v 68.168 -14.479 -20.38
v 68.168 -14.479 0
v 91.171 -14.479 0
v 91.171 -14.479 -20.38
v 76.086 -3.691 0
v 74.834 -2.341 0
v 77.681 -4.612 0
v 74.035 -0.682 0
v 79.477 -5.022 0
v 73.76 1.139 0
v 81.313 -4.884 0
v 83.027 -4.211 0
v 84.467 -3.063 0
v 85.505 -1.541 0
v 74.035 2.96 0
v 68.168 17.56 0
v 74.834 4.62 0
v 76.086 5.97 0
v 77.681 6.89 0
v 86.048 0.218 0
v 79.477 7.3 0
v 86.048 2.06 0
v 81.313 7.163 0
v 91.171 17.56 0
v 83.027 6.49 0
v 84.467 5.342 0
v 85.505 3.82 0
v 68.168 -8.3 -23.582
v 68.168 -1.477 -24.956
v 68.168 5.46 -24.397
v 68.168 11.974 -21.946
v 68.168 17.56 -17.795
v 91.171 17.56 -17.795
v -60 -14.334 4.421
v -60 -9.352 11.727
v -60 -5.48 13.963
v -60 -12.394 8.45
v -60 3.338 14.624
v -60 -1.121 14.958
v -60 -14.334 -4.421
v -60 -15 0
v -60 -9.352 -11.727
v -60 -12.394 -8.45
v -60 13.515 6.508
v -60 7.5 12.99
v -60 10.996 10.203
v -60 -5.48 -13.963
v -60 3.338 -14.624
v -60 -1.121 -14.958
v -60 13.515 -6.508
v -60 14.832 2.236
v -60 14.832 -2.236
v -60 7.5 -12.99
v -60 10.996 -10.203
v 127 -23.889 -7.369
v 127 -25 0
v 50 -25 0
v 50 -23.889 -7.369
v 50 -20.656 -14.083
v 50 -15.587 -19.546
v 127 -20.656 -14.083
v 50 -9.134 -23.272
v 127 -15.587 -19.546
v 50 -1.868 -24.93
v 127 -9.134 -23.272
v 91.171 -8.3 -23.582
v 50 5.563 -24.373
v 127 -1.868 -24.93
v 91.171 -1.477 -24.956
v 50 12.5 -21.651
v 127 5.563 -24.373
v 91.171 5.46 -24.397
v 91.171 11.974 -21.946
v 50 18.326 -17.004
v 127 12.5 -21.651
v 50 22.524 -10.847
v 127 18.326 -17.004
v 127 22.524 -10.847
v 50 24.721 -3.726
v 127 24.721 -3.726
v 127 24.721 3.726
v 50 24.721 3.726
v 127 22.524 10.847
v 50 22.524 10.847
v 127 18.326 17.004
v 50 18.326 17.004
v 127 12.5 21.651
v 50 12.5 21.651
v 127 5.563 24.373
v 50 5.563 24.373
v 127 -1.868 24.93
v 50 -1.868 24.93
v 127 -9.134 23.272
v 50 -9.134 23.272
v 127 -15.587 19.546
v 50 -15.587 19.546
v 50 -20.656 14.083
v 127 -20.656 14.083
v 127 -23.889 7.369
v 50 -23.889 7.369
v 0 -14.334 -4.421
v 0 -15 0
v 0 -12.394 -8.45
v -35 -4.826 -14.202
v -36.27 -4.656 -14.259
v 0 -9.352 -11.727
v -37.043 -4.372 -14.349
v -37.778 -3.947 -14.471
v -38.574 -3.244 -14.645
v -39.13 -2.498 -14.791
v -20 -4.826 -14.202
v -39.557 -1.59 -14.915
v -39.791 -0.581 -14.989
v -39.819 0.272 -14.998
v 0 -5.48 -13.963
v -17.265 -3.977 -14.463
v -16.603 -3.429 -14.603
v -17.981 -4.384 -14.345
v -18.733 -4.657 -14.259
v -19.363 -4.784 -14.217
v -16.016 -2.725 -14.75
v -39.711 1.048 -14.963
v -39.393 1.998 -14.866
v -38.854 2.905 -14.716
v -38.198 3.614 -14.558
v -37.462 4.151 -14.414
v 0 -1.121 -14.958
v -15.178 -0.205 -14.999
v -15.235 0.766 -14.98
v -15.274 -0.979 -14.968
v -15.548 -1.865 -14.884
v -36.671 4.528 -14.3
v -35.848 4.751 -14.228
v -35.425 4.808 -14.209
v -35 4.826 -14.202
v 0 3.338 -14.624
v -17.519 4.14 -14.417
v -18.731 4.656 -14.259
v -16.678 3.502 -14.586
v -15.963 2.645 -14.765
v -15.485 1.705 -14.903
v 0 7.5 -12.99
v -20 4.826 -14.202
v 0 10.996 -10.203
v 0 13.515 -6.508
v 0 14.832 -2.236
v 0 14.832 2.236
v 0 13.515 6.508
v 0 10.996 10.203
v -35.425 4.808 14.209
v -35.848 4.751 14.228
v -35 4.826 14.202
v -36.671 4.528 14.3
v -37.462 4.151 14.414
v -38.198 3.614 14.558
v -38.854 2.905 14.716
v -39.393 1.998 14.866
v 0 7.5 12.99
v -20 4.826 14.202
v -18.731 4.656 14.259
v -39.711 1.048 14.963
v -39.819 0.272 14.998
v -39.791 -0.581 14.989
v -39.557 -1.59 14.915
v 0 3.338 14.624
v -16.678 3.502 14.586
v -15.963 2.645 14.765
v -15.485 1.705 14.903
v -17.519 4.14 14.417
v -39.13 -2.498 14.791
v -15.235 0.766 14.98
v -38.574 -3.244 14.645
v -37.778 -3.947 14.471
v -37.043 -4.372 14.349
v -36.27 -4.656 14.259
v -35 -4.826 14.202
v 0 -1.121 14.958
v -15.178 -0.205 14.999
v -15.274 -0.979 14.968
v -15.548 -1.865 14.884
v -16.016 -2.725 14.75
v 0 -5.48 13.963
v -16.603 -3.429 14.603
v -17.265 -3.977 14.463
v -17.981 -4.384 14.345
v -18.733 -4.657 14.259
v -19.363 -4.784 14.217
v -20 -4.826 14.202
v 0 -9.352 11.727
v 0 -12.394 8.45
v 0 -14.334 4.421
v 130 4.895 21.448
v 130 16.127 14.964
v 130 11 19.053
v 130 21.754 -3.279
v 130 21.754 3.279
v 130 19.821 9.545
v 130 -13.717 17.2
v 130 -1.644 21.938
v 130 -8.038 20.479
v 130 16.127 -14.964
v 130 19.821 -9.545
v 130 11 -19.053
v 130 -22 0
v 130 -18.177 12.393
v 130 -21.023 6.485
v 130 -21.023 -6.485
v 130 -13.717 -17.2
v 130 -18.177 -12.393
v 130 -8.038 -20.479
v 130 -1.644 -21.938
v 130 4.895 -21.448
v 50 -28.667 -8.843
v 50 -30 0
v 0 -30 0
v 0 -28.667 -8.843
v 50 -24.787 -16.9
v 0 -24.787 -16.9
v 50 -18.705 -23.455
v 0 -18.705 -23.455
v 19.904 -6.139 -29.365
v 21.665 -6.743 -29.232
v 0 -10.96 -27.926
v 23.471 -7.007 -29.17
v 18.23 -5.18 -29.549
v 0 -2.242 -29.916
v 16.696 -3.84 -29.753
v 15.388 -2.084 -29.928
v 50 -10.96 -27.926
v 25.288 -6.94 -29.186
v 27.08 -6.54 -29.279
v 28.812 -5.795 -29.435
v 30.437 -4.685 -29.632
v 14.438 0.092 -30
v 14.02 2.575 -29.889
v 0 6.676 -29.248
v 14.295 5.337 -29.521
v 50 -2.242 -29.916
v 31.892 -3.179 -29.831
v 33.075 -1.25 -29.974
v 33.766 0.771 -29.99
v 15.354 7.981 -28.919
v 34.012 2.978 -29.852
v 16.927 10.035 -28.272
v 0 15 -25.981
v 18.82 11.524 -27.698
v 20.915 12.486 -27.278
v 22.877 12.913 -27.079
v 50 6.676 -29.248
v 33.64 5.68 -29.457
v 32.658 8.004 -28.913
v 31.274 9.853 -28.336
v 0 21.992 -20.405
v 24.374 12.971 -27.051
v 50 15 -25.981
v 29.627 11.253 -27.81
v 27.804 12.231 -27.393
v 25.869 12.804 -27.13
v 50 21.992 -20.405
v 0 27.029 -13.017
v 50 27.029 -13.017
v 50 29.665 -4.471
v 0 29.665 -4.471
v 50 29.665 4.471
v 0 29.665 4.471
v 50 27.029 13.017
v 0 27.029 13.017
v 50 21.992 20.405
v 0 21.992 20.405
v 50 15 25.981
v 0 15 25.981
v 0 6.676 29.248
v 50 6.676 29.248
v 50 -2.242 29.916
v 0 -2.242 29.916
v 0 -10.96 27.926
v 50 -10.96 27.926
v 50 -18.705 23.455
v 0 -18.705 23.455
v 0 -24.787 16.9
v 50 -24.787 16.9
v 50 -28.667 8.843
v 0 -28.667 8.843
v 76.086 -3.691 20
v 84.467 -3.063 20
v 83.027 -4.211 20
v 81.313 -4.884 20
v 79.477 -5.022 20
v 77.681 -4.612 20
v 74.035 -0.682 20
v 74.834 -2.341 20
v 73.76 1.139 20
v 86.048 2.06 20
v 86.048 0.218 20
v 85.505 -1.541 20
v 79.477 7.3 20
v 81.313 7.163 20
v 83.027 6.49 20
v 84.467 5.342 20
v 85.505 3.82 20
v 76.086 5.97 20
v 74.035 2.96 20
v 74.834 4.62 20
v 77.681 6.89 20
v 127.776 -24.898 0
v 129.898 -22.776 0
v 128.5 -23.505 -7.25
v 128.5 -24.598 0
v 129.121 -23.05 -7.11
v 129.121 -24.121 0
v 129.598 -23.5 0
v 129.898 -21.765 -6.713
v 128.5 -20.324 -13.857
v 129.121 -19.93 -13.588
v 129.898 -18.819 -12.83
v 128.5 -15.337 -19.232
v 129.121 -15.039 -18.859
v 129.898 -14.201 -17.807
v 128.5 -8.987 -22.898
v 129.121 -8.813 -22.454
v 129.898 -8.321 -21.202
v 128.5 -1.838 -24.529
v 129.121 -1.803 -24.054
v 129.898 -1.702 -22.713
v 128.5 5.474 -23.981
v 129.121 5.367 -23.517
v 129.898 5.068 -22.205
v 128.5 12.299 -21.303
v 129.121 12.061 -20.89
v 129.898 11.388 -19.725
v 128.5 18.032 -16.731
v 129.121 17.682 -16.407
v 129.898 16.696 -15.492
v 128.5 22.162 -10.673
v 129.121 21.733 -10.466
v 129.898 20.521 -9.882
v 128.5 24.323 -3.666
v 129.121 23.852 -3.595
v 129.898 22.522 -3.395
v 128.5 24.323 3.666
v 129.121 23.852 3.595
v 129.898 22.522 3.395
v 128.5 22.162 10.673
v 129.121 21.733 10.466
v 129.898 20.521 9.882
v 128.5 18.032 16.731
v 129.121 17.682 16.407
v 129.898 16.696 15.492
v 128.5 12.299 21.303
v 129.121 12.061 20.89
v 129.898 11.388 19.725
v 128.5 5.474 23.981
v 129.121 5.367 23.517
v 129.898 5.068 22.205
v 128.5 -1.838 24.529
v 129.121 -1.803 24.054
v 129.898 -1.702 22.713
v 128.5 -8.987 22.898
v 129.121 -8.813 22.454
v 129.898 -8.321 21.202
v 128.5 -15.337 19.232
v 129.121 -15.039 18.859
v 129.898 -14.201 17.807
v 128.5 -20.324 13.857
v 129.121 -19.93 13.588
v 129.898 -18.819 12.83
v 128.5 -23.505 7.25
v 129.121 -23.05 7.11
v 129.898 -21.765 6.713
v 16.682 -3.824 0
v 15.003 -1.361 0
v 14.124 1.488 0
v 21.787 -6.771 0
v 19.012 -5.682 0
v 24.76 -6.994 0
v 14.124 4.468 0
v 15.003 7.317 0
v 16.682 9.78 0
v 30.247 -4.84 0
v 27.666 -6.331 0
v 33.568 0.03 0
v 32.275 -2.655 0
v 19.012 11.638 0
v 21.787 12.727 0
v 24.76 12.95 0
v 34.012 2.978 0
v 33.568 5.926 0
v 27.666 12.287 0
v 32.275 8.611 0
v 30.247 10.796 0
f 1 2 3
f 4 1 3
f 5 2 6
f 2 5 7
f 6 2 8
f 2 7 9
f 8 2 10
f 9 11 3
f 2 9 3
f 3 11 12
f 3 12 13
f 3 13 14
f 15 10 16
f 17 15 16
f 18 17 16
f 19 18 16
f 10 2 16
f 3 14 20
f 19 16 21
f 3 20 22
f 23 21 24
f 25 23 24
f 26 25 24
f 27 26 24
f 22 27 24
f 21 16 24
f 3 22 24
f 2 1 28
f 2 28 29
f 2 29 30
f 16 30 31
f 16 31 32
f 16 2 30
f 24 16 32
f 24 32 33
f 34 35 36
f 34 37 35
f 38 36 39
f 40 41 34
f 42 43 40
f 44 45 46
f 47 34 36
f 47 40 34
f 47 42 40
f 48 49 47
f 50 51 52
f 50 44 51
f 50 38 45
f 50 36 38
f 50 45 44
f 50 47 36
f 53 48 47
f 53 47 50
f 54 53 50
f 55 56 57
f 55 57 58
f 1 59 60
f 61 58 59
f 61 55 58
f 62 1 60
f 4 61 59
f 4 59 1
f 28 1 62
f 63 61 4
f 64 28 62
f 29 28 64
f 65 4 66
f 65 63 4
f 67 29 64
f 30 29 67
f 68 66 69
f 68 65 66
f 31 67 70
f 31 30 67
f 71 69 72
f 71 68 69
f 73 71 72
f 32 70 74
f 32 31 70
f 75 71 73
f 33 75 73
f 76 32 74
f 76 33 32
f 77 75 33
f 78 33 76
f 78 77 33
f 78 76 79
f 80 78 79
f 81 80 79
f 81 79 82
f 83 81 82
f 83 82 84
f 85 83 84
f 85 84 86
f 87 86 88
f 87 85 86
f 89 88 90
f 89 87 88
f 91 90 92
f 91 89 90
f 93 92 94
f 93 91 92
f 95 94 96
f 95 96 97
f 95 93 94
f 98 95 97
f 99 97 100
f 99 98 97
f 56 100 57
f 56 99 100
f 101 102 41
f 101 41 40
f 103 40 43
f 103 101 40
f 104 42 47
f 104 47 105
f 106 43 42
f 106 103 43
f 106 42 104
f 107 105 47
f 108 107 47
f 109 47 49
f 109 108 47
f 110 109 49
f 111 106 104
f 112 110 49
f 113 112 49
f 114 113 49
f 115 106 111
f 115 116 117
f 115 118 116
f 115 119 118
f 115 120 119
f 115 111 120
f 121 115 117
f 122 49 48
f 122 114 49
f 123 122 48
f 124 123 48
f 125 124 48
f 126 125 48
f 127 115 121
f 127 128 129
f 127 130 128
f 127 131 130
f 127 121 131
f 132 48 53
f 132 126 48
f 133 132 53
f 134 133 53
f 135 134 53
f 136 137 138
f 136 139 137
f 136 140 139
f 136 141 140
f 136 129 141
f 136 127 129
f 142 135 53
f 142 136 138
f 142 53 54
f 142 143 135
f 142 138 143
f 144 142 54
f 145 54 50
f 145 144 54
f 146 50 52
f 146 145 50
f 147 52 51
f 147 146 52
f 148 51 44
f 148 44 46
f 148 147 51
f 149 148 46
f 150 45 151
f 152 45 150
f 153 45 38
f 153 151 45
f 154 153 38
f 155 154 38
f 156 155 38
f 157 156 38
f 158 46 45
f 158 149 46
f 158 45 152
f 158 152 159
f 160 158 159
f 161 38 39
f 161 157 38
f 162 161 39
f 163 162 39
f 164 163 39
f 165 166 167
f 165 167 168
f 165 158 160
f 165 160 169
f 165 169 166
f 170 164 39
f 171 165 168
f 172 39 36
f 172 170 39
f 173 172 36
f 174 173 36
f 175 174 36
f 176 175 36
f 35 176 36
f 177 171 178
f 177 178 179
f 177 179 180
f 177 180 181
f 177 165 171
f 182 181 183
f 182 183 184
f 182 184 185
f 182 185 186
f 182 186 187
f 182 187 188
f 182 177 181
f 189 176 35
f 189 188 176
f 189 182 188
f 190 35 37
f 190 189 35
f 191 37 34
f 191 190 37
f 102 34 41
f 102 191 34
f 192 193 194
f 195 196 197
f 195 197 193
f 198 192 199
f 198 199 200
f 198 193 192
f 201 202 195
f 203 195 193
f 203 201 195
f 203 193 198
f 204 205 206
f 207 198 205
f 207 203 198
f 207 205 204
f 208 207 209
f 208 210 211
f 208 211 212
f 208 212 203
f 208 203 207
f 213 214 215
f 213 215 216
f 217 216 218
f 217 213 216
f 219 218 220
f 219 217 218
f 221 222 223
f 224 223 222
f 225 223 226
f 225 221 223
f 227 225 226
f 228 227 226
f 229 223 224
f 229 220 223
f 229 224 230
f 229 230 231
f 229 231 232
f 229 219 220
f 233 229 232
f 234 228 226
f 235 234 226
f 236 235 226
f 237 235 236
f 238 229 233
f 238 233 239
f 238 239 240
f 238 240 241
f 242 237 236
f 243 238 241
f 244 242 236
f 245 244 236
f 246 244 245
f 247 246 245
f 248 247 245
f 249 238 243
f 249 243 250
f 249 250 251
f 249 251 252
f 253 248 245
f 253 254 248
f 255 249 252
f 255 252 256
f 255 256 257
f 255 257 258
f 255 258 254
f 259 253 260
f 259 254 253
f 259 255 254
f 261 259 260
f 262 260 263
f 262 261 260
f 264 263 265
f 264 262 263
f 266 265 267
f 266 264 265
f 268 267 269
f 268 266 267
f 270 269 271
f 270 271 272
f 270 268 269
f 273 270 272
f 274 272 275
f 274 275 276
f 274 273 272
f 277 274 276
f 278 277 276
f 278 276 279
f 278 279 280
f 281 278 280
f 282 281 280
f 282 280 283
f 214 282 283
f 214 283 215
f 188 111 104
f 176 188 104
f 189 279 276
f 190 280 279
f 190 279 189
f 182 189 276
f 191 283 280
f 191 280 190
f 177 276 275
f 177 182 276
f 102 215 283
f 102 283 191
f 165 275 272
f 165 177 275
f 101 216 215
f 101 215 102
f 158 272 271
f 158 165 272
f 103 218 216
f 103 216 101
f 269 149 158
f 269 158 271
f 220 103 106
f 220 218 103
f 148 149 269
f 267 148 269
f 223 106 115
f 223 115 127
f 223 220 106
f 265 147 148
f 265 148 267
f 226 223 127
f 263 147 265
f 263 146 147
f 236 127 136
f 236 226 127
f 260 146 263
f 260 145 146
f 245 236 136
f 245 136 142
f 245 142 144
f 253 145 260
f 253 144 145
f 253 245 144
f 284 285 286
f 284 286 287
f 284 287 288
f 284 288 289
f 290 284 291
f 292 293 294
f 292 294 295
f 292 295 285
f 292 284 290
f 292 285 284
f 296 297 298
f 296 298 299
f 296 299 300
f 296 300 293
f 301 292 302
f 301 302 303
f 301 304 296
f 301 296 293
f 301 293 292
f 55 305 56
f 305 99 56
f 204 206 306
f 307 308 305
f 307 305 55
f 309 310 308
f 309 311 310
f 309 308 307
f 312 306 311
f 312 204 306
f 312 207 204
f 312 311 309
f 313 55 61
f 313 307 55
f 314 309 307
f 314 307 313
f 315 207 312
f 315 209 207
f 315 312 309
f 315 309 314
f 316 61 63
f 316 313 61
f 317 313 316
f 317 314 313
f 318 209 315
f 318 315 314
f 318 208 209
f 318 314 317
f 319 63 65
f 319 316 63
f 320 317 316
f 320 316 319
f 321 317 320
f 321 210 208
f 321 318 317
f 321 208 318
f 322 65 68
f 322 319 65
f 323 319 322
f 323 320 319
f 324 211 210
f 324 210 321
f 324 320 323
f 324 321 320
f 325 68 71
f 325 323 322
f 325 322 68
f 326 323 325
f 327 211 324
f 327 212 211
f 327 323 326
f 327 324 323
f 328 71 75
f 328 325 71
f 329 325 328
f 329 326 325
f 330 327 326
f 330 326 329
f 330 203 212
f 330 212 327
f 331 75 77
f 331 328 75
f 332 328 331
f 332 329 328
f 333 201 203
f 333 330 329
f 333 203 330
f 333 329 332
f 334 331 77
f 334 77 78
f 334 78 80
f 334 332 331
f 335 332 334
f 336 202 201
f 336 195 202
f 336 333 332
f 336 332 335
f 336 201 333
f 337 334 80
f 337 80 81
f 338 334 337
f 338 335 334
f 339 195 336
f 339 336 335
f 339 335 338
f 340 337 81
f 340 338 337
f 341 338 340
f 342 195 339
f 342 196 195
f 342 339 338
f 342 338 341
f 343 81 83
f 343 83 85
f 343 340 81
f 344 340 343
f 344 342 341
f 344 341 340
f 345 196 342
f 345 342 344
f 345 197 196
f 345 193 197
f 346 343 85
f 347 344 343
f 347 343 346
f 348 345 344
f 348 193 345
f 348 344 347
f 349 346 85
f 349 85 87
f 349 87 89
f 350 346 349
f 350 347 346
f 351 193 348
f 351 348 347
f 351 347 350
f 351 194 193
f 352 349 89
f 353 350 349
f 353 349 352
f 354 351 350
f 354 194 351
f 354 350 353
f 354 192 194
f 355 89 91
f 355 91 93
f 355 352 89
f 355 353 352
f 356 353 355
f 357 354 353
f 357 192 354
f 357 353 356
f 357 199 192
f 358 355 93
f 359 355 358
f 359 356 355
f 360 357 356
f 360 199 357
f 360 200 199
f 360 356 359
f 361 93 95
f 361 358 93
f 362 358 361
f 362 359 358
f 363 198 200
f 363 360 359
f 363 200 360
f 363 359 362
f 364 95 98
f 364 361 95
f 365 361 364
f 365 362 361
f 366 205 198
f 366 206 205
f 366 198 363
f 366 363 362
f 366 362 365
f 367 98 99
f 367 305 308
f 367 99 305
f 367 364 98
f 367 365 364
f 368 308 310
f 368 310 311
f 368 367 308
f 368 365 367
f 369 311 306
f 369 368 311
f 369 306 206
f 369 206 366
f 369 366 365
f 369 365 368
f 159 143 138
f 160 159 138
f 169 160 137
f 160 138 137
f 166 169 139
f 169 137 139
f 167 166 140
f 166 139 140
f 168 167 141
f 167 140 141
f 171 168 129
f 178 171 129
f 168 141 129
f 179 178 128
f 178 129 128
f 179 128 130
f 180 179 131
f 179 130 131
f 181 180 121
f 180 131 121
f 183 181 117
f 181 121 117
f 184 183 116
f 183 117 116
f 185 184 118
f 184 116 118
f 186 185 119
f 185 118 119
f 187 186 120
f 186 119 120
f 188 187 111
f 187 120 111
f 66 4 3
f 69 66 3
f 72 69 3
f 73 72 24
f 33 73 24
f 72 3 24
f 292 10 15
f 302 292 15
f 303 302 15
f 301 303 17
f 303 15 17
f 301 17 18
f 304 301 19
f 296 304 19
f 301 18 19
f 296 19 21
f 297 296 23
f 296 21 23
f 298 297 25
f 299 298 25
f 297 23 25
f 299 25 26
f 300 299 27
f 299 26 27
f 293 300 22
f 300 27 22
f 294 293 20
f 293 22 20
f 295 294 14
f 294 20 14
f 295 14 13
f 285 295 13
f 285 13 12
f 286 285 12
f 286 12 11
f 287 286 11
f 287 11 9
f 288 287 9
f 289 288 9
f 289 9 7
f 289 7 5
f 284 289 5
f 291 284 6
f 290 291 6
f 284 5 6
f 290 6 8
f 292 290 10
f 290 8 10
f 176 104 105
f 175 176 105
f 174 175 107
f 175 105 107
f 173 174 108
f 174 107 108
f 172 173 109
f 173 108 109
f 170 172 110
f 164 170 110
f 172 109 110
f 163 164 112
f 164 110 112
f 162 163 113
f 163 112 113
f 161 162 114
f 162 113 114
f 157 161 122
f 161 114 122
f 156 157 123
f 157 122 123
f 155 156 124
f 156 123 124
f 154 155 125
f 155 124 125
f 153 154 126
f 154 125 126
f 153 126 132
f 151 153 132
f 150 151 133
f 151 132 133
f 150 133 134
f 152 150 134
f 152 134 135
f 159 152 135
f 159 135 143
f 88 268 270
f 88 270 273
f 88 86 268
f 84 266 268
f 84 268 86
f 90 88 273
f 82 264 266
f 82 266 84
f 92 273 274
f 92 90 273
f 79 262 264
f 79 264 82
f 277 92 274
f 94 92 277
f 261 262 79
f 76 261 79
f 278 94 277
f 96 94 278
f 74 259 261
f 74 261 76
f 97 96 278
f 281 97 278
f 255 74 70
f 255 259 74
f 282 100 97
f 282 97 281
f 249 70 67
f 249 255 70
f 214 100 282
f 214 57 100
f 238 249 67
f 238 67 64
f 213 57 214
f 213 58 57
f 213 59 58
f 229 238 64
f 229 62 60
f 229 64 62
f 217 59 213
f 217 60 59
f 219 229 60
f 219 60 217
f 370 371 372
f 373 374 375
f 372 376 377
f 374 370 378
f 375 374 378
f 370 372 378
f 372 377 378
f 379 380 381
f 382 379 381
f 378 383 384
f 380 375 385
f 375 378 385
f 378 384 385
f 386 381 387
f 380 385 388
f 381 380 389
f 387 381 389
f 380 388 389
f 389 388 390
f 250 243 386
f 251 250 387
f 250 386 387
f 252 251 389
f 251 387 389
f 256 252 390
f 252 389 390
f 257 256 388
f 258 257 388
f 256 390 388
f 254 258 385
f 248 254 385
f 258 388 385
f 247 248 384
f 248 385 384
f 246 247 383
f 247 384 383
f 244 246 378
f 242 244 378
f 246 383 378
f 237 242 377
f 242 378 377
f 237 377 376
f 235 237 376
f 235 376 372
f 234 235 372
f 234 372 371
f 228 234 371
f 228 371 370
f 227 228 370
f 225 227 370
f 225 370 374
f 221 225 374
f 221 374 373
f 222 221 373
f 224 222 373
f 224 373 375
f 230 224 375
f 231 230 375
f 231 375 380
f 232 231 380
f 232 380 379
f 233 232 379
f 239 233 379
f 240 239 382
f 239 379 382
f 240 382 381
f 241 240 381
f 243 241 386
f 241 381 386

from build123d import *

# Parameters (mm, degrees)
FILLET1_R               = 3
SKETCH2_W               = 23.002294749
SKETCH2_H               = 32.038910542
CUT_EXTRUDE1_DEPTH      = 30
SKETCH3_R               = 6.178270045
CUT_EXTRUDE2_DEPTH      = 20
SKETCH4_R               = 10
CUT_EXTRUDE3_DEPTH      = 30
CUT_EXTRUDE4_DEPTH      = 137.747943453
CUT_EXTRUDE4_DEPTH_BACK = 33


with BuildPart() as part:
    # Sketch1 → Revolve1 (revolve)
    with BuildSketch(Plane.XY, mode=Mode.PRIVATE) as revolve1_sk:
        Polygon((0, 0), (-60, 0), (-60, 15), (0, 15), (0, 30), (50, 30), (50, 25), (130, 25), (130, 0), align=None)
    revolve(revolve1_sk.sketch.rotate(Axis((-83.2159872, 0, 0), (1, 0, 0)), 180), axis=Axis((-83.2159872, 0, 0), (1, 0, 0)))

    # Fillet1
    fillet1_edges = [part.edges().sort_by_distance(p)[0] for p in [
        (130, 25, 0),
    ]]
    fillet(fillet1_edges, radius=FILLET1_R)

    # Sketch2 → Cut-Extrude1 (cut)
    with BuildSketch(Plane.XY):
        with Locations((79.66963489, 1.540332238)):
            Rectangle(SKETCH2_W, SKETCH2_H)
    extrude(amount=-CUT_EXTRUDE1_DEPTH, mode=Mode.SUBTRACT)

    # Sketch3 → Cut-Extrude2 (cut)
    with BuildSketch(Plane(origin=(0, 0, 0), x_dir=(-1, 0, 0), z_dir=(0, 0, -1))):
        with Locations((-79.938300401, 1.139218287)):
            Circle(SKETCH3_R)
    extrude(amount=-CUT_EXTRUDE2_DEPTH, mode=Mode.SUBTRACT)

    # Sketch4 → Cut-Extrude3 (cut)
    with BuildSketch(Plane.XY):
        with Locations((24.012296705, 2.977975659)):
            Circle(SKETCH4_R)
    extrude(amount=-CUT_EXTRUDE3_DEPTH, mode=Mode.SUBTRACT)

    # Sketch6 → Cut-Extrude4 (cut, two sides: drawn at the far end of the back side and taken through both)
    with BuildSketch(Plane.XY.offset(-CUT_EXTRUDE4_DEPTH_BACK)):
        with BuildLine():
            Line((-35, 4.826374344), (-20, 4.826374344))
            ThreePointArc((-20, 4.826374344), (-15.173625656, 0), (-20, -4.826374344))
            Line((-20, -4.826374344), (-35, -4.826374344))
            ThreePointArc((-35, -4.826374344), (-39.826374344, 0), (-35, 4.826374344))
        make_face()
    extrude(amount=CUT_EXTRUDE4_DEPTH + CUT_EXTRUDE4_DEPTH_BACK, mode=Mode.SUBTRACT)


solid = part.part
